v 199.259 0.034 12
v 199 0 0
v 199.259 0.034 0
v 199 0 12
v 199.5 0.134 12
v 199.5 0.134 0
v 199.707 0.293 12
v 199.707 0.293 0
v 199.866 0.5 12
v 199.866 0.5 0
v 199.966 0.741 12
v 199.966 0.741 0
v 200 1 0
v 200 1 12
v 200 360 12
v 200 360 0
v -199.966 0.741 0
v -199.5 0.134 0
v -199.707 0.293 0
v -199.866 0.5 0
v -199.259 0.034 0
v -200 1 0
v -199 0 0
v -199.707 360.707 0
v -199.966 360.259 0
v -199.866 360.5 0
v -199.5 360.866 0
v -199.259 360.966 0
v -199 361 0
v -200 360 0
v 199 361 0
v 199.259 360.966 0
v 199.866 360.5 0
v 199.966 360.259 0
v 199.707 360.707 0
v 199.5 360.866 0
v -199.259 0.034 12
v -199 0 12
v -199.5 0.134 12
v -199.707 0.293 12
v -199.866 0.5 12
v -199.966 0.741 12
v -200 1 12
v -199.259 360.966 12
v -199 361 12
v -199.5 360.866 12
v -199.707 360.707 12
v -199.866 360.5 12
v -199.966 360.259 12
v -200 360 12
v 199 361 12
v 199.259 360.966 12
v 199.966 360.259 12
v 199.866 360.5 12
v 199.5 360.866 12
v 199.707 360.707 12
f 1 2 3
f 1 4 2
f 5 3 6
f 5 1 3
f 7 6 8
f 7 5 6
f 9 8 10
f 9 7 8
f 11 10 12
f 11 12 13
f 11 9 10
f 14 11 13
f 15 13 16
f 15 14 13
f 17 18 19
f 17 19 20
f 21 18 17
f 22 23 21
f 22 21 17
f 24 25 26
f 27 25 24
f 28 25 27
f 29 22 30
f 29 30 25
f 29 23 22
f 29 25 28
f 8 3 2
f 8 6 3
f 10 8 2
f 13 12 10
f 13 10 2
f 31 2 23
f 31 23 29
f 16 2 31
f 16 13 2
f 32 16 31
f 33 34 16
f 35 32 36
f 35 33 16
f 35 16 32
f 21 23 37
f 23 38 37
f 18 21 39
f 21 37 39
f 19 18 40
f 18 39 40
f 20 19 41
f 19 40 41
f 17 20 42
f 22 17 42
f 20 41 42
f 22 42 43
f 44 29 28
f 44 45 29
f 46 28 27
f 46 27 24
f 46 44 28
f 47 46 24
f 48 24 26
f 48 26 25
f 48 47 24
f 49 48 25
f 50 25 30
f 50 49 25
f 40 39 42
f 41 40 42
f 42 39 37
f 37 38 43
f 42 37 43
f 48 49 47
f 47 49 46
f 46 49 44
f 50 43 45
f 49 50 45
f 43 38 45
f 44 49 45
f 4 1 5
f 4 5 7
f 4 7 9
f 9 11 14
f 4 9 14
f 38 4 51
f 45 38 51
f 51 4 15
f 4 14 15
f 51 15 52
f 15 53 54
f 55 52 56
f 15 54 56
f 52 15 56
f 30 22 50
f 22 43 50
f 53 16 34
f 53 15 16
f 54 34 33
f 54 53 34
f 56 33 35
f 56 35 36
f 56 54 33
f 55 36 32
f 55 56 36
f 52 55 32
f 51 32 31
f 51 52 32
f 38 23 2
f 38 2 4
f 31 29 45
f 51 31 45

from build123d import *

# Parameters (mm, degrees)
F0_W     = 361
F0_H     = 12
F1_DEPTH = 200
F2_R     = 1


with BuildPart() as f1:
    # F0 (on Right) → F1 (new body, symmetric)
    with BuildSketch(Plane.YZ):
        with Locations((180.5, 6)):
            Rectangle(F0_W, F0_H)
    extrude(amount=F1_DEPTH, both=True)

    # F2
    f2_edges = [f1.edges().sort_by_distance(p)[0] for p in [
        (-200, 0, 6),
        (200, 0, 6),
        (200, 361, 6),
        (-200, 361, 6),
    ]]
    fillet(f2_edges, radius=F2_R)


solid = f1.part
